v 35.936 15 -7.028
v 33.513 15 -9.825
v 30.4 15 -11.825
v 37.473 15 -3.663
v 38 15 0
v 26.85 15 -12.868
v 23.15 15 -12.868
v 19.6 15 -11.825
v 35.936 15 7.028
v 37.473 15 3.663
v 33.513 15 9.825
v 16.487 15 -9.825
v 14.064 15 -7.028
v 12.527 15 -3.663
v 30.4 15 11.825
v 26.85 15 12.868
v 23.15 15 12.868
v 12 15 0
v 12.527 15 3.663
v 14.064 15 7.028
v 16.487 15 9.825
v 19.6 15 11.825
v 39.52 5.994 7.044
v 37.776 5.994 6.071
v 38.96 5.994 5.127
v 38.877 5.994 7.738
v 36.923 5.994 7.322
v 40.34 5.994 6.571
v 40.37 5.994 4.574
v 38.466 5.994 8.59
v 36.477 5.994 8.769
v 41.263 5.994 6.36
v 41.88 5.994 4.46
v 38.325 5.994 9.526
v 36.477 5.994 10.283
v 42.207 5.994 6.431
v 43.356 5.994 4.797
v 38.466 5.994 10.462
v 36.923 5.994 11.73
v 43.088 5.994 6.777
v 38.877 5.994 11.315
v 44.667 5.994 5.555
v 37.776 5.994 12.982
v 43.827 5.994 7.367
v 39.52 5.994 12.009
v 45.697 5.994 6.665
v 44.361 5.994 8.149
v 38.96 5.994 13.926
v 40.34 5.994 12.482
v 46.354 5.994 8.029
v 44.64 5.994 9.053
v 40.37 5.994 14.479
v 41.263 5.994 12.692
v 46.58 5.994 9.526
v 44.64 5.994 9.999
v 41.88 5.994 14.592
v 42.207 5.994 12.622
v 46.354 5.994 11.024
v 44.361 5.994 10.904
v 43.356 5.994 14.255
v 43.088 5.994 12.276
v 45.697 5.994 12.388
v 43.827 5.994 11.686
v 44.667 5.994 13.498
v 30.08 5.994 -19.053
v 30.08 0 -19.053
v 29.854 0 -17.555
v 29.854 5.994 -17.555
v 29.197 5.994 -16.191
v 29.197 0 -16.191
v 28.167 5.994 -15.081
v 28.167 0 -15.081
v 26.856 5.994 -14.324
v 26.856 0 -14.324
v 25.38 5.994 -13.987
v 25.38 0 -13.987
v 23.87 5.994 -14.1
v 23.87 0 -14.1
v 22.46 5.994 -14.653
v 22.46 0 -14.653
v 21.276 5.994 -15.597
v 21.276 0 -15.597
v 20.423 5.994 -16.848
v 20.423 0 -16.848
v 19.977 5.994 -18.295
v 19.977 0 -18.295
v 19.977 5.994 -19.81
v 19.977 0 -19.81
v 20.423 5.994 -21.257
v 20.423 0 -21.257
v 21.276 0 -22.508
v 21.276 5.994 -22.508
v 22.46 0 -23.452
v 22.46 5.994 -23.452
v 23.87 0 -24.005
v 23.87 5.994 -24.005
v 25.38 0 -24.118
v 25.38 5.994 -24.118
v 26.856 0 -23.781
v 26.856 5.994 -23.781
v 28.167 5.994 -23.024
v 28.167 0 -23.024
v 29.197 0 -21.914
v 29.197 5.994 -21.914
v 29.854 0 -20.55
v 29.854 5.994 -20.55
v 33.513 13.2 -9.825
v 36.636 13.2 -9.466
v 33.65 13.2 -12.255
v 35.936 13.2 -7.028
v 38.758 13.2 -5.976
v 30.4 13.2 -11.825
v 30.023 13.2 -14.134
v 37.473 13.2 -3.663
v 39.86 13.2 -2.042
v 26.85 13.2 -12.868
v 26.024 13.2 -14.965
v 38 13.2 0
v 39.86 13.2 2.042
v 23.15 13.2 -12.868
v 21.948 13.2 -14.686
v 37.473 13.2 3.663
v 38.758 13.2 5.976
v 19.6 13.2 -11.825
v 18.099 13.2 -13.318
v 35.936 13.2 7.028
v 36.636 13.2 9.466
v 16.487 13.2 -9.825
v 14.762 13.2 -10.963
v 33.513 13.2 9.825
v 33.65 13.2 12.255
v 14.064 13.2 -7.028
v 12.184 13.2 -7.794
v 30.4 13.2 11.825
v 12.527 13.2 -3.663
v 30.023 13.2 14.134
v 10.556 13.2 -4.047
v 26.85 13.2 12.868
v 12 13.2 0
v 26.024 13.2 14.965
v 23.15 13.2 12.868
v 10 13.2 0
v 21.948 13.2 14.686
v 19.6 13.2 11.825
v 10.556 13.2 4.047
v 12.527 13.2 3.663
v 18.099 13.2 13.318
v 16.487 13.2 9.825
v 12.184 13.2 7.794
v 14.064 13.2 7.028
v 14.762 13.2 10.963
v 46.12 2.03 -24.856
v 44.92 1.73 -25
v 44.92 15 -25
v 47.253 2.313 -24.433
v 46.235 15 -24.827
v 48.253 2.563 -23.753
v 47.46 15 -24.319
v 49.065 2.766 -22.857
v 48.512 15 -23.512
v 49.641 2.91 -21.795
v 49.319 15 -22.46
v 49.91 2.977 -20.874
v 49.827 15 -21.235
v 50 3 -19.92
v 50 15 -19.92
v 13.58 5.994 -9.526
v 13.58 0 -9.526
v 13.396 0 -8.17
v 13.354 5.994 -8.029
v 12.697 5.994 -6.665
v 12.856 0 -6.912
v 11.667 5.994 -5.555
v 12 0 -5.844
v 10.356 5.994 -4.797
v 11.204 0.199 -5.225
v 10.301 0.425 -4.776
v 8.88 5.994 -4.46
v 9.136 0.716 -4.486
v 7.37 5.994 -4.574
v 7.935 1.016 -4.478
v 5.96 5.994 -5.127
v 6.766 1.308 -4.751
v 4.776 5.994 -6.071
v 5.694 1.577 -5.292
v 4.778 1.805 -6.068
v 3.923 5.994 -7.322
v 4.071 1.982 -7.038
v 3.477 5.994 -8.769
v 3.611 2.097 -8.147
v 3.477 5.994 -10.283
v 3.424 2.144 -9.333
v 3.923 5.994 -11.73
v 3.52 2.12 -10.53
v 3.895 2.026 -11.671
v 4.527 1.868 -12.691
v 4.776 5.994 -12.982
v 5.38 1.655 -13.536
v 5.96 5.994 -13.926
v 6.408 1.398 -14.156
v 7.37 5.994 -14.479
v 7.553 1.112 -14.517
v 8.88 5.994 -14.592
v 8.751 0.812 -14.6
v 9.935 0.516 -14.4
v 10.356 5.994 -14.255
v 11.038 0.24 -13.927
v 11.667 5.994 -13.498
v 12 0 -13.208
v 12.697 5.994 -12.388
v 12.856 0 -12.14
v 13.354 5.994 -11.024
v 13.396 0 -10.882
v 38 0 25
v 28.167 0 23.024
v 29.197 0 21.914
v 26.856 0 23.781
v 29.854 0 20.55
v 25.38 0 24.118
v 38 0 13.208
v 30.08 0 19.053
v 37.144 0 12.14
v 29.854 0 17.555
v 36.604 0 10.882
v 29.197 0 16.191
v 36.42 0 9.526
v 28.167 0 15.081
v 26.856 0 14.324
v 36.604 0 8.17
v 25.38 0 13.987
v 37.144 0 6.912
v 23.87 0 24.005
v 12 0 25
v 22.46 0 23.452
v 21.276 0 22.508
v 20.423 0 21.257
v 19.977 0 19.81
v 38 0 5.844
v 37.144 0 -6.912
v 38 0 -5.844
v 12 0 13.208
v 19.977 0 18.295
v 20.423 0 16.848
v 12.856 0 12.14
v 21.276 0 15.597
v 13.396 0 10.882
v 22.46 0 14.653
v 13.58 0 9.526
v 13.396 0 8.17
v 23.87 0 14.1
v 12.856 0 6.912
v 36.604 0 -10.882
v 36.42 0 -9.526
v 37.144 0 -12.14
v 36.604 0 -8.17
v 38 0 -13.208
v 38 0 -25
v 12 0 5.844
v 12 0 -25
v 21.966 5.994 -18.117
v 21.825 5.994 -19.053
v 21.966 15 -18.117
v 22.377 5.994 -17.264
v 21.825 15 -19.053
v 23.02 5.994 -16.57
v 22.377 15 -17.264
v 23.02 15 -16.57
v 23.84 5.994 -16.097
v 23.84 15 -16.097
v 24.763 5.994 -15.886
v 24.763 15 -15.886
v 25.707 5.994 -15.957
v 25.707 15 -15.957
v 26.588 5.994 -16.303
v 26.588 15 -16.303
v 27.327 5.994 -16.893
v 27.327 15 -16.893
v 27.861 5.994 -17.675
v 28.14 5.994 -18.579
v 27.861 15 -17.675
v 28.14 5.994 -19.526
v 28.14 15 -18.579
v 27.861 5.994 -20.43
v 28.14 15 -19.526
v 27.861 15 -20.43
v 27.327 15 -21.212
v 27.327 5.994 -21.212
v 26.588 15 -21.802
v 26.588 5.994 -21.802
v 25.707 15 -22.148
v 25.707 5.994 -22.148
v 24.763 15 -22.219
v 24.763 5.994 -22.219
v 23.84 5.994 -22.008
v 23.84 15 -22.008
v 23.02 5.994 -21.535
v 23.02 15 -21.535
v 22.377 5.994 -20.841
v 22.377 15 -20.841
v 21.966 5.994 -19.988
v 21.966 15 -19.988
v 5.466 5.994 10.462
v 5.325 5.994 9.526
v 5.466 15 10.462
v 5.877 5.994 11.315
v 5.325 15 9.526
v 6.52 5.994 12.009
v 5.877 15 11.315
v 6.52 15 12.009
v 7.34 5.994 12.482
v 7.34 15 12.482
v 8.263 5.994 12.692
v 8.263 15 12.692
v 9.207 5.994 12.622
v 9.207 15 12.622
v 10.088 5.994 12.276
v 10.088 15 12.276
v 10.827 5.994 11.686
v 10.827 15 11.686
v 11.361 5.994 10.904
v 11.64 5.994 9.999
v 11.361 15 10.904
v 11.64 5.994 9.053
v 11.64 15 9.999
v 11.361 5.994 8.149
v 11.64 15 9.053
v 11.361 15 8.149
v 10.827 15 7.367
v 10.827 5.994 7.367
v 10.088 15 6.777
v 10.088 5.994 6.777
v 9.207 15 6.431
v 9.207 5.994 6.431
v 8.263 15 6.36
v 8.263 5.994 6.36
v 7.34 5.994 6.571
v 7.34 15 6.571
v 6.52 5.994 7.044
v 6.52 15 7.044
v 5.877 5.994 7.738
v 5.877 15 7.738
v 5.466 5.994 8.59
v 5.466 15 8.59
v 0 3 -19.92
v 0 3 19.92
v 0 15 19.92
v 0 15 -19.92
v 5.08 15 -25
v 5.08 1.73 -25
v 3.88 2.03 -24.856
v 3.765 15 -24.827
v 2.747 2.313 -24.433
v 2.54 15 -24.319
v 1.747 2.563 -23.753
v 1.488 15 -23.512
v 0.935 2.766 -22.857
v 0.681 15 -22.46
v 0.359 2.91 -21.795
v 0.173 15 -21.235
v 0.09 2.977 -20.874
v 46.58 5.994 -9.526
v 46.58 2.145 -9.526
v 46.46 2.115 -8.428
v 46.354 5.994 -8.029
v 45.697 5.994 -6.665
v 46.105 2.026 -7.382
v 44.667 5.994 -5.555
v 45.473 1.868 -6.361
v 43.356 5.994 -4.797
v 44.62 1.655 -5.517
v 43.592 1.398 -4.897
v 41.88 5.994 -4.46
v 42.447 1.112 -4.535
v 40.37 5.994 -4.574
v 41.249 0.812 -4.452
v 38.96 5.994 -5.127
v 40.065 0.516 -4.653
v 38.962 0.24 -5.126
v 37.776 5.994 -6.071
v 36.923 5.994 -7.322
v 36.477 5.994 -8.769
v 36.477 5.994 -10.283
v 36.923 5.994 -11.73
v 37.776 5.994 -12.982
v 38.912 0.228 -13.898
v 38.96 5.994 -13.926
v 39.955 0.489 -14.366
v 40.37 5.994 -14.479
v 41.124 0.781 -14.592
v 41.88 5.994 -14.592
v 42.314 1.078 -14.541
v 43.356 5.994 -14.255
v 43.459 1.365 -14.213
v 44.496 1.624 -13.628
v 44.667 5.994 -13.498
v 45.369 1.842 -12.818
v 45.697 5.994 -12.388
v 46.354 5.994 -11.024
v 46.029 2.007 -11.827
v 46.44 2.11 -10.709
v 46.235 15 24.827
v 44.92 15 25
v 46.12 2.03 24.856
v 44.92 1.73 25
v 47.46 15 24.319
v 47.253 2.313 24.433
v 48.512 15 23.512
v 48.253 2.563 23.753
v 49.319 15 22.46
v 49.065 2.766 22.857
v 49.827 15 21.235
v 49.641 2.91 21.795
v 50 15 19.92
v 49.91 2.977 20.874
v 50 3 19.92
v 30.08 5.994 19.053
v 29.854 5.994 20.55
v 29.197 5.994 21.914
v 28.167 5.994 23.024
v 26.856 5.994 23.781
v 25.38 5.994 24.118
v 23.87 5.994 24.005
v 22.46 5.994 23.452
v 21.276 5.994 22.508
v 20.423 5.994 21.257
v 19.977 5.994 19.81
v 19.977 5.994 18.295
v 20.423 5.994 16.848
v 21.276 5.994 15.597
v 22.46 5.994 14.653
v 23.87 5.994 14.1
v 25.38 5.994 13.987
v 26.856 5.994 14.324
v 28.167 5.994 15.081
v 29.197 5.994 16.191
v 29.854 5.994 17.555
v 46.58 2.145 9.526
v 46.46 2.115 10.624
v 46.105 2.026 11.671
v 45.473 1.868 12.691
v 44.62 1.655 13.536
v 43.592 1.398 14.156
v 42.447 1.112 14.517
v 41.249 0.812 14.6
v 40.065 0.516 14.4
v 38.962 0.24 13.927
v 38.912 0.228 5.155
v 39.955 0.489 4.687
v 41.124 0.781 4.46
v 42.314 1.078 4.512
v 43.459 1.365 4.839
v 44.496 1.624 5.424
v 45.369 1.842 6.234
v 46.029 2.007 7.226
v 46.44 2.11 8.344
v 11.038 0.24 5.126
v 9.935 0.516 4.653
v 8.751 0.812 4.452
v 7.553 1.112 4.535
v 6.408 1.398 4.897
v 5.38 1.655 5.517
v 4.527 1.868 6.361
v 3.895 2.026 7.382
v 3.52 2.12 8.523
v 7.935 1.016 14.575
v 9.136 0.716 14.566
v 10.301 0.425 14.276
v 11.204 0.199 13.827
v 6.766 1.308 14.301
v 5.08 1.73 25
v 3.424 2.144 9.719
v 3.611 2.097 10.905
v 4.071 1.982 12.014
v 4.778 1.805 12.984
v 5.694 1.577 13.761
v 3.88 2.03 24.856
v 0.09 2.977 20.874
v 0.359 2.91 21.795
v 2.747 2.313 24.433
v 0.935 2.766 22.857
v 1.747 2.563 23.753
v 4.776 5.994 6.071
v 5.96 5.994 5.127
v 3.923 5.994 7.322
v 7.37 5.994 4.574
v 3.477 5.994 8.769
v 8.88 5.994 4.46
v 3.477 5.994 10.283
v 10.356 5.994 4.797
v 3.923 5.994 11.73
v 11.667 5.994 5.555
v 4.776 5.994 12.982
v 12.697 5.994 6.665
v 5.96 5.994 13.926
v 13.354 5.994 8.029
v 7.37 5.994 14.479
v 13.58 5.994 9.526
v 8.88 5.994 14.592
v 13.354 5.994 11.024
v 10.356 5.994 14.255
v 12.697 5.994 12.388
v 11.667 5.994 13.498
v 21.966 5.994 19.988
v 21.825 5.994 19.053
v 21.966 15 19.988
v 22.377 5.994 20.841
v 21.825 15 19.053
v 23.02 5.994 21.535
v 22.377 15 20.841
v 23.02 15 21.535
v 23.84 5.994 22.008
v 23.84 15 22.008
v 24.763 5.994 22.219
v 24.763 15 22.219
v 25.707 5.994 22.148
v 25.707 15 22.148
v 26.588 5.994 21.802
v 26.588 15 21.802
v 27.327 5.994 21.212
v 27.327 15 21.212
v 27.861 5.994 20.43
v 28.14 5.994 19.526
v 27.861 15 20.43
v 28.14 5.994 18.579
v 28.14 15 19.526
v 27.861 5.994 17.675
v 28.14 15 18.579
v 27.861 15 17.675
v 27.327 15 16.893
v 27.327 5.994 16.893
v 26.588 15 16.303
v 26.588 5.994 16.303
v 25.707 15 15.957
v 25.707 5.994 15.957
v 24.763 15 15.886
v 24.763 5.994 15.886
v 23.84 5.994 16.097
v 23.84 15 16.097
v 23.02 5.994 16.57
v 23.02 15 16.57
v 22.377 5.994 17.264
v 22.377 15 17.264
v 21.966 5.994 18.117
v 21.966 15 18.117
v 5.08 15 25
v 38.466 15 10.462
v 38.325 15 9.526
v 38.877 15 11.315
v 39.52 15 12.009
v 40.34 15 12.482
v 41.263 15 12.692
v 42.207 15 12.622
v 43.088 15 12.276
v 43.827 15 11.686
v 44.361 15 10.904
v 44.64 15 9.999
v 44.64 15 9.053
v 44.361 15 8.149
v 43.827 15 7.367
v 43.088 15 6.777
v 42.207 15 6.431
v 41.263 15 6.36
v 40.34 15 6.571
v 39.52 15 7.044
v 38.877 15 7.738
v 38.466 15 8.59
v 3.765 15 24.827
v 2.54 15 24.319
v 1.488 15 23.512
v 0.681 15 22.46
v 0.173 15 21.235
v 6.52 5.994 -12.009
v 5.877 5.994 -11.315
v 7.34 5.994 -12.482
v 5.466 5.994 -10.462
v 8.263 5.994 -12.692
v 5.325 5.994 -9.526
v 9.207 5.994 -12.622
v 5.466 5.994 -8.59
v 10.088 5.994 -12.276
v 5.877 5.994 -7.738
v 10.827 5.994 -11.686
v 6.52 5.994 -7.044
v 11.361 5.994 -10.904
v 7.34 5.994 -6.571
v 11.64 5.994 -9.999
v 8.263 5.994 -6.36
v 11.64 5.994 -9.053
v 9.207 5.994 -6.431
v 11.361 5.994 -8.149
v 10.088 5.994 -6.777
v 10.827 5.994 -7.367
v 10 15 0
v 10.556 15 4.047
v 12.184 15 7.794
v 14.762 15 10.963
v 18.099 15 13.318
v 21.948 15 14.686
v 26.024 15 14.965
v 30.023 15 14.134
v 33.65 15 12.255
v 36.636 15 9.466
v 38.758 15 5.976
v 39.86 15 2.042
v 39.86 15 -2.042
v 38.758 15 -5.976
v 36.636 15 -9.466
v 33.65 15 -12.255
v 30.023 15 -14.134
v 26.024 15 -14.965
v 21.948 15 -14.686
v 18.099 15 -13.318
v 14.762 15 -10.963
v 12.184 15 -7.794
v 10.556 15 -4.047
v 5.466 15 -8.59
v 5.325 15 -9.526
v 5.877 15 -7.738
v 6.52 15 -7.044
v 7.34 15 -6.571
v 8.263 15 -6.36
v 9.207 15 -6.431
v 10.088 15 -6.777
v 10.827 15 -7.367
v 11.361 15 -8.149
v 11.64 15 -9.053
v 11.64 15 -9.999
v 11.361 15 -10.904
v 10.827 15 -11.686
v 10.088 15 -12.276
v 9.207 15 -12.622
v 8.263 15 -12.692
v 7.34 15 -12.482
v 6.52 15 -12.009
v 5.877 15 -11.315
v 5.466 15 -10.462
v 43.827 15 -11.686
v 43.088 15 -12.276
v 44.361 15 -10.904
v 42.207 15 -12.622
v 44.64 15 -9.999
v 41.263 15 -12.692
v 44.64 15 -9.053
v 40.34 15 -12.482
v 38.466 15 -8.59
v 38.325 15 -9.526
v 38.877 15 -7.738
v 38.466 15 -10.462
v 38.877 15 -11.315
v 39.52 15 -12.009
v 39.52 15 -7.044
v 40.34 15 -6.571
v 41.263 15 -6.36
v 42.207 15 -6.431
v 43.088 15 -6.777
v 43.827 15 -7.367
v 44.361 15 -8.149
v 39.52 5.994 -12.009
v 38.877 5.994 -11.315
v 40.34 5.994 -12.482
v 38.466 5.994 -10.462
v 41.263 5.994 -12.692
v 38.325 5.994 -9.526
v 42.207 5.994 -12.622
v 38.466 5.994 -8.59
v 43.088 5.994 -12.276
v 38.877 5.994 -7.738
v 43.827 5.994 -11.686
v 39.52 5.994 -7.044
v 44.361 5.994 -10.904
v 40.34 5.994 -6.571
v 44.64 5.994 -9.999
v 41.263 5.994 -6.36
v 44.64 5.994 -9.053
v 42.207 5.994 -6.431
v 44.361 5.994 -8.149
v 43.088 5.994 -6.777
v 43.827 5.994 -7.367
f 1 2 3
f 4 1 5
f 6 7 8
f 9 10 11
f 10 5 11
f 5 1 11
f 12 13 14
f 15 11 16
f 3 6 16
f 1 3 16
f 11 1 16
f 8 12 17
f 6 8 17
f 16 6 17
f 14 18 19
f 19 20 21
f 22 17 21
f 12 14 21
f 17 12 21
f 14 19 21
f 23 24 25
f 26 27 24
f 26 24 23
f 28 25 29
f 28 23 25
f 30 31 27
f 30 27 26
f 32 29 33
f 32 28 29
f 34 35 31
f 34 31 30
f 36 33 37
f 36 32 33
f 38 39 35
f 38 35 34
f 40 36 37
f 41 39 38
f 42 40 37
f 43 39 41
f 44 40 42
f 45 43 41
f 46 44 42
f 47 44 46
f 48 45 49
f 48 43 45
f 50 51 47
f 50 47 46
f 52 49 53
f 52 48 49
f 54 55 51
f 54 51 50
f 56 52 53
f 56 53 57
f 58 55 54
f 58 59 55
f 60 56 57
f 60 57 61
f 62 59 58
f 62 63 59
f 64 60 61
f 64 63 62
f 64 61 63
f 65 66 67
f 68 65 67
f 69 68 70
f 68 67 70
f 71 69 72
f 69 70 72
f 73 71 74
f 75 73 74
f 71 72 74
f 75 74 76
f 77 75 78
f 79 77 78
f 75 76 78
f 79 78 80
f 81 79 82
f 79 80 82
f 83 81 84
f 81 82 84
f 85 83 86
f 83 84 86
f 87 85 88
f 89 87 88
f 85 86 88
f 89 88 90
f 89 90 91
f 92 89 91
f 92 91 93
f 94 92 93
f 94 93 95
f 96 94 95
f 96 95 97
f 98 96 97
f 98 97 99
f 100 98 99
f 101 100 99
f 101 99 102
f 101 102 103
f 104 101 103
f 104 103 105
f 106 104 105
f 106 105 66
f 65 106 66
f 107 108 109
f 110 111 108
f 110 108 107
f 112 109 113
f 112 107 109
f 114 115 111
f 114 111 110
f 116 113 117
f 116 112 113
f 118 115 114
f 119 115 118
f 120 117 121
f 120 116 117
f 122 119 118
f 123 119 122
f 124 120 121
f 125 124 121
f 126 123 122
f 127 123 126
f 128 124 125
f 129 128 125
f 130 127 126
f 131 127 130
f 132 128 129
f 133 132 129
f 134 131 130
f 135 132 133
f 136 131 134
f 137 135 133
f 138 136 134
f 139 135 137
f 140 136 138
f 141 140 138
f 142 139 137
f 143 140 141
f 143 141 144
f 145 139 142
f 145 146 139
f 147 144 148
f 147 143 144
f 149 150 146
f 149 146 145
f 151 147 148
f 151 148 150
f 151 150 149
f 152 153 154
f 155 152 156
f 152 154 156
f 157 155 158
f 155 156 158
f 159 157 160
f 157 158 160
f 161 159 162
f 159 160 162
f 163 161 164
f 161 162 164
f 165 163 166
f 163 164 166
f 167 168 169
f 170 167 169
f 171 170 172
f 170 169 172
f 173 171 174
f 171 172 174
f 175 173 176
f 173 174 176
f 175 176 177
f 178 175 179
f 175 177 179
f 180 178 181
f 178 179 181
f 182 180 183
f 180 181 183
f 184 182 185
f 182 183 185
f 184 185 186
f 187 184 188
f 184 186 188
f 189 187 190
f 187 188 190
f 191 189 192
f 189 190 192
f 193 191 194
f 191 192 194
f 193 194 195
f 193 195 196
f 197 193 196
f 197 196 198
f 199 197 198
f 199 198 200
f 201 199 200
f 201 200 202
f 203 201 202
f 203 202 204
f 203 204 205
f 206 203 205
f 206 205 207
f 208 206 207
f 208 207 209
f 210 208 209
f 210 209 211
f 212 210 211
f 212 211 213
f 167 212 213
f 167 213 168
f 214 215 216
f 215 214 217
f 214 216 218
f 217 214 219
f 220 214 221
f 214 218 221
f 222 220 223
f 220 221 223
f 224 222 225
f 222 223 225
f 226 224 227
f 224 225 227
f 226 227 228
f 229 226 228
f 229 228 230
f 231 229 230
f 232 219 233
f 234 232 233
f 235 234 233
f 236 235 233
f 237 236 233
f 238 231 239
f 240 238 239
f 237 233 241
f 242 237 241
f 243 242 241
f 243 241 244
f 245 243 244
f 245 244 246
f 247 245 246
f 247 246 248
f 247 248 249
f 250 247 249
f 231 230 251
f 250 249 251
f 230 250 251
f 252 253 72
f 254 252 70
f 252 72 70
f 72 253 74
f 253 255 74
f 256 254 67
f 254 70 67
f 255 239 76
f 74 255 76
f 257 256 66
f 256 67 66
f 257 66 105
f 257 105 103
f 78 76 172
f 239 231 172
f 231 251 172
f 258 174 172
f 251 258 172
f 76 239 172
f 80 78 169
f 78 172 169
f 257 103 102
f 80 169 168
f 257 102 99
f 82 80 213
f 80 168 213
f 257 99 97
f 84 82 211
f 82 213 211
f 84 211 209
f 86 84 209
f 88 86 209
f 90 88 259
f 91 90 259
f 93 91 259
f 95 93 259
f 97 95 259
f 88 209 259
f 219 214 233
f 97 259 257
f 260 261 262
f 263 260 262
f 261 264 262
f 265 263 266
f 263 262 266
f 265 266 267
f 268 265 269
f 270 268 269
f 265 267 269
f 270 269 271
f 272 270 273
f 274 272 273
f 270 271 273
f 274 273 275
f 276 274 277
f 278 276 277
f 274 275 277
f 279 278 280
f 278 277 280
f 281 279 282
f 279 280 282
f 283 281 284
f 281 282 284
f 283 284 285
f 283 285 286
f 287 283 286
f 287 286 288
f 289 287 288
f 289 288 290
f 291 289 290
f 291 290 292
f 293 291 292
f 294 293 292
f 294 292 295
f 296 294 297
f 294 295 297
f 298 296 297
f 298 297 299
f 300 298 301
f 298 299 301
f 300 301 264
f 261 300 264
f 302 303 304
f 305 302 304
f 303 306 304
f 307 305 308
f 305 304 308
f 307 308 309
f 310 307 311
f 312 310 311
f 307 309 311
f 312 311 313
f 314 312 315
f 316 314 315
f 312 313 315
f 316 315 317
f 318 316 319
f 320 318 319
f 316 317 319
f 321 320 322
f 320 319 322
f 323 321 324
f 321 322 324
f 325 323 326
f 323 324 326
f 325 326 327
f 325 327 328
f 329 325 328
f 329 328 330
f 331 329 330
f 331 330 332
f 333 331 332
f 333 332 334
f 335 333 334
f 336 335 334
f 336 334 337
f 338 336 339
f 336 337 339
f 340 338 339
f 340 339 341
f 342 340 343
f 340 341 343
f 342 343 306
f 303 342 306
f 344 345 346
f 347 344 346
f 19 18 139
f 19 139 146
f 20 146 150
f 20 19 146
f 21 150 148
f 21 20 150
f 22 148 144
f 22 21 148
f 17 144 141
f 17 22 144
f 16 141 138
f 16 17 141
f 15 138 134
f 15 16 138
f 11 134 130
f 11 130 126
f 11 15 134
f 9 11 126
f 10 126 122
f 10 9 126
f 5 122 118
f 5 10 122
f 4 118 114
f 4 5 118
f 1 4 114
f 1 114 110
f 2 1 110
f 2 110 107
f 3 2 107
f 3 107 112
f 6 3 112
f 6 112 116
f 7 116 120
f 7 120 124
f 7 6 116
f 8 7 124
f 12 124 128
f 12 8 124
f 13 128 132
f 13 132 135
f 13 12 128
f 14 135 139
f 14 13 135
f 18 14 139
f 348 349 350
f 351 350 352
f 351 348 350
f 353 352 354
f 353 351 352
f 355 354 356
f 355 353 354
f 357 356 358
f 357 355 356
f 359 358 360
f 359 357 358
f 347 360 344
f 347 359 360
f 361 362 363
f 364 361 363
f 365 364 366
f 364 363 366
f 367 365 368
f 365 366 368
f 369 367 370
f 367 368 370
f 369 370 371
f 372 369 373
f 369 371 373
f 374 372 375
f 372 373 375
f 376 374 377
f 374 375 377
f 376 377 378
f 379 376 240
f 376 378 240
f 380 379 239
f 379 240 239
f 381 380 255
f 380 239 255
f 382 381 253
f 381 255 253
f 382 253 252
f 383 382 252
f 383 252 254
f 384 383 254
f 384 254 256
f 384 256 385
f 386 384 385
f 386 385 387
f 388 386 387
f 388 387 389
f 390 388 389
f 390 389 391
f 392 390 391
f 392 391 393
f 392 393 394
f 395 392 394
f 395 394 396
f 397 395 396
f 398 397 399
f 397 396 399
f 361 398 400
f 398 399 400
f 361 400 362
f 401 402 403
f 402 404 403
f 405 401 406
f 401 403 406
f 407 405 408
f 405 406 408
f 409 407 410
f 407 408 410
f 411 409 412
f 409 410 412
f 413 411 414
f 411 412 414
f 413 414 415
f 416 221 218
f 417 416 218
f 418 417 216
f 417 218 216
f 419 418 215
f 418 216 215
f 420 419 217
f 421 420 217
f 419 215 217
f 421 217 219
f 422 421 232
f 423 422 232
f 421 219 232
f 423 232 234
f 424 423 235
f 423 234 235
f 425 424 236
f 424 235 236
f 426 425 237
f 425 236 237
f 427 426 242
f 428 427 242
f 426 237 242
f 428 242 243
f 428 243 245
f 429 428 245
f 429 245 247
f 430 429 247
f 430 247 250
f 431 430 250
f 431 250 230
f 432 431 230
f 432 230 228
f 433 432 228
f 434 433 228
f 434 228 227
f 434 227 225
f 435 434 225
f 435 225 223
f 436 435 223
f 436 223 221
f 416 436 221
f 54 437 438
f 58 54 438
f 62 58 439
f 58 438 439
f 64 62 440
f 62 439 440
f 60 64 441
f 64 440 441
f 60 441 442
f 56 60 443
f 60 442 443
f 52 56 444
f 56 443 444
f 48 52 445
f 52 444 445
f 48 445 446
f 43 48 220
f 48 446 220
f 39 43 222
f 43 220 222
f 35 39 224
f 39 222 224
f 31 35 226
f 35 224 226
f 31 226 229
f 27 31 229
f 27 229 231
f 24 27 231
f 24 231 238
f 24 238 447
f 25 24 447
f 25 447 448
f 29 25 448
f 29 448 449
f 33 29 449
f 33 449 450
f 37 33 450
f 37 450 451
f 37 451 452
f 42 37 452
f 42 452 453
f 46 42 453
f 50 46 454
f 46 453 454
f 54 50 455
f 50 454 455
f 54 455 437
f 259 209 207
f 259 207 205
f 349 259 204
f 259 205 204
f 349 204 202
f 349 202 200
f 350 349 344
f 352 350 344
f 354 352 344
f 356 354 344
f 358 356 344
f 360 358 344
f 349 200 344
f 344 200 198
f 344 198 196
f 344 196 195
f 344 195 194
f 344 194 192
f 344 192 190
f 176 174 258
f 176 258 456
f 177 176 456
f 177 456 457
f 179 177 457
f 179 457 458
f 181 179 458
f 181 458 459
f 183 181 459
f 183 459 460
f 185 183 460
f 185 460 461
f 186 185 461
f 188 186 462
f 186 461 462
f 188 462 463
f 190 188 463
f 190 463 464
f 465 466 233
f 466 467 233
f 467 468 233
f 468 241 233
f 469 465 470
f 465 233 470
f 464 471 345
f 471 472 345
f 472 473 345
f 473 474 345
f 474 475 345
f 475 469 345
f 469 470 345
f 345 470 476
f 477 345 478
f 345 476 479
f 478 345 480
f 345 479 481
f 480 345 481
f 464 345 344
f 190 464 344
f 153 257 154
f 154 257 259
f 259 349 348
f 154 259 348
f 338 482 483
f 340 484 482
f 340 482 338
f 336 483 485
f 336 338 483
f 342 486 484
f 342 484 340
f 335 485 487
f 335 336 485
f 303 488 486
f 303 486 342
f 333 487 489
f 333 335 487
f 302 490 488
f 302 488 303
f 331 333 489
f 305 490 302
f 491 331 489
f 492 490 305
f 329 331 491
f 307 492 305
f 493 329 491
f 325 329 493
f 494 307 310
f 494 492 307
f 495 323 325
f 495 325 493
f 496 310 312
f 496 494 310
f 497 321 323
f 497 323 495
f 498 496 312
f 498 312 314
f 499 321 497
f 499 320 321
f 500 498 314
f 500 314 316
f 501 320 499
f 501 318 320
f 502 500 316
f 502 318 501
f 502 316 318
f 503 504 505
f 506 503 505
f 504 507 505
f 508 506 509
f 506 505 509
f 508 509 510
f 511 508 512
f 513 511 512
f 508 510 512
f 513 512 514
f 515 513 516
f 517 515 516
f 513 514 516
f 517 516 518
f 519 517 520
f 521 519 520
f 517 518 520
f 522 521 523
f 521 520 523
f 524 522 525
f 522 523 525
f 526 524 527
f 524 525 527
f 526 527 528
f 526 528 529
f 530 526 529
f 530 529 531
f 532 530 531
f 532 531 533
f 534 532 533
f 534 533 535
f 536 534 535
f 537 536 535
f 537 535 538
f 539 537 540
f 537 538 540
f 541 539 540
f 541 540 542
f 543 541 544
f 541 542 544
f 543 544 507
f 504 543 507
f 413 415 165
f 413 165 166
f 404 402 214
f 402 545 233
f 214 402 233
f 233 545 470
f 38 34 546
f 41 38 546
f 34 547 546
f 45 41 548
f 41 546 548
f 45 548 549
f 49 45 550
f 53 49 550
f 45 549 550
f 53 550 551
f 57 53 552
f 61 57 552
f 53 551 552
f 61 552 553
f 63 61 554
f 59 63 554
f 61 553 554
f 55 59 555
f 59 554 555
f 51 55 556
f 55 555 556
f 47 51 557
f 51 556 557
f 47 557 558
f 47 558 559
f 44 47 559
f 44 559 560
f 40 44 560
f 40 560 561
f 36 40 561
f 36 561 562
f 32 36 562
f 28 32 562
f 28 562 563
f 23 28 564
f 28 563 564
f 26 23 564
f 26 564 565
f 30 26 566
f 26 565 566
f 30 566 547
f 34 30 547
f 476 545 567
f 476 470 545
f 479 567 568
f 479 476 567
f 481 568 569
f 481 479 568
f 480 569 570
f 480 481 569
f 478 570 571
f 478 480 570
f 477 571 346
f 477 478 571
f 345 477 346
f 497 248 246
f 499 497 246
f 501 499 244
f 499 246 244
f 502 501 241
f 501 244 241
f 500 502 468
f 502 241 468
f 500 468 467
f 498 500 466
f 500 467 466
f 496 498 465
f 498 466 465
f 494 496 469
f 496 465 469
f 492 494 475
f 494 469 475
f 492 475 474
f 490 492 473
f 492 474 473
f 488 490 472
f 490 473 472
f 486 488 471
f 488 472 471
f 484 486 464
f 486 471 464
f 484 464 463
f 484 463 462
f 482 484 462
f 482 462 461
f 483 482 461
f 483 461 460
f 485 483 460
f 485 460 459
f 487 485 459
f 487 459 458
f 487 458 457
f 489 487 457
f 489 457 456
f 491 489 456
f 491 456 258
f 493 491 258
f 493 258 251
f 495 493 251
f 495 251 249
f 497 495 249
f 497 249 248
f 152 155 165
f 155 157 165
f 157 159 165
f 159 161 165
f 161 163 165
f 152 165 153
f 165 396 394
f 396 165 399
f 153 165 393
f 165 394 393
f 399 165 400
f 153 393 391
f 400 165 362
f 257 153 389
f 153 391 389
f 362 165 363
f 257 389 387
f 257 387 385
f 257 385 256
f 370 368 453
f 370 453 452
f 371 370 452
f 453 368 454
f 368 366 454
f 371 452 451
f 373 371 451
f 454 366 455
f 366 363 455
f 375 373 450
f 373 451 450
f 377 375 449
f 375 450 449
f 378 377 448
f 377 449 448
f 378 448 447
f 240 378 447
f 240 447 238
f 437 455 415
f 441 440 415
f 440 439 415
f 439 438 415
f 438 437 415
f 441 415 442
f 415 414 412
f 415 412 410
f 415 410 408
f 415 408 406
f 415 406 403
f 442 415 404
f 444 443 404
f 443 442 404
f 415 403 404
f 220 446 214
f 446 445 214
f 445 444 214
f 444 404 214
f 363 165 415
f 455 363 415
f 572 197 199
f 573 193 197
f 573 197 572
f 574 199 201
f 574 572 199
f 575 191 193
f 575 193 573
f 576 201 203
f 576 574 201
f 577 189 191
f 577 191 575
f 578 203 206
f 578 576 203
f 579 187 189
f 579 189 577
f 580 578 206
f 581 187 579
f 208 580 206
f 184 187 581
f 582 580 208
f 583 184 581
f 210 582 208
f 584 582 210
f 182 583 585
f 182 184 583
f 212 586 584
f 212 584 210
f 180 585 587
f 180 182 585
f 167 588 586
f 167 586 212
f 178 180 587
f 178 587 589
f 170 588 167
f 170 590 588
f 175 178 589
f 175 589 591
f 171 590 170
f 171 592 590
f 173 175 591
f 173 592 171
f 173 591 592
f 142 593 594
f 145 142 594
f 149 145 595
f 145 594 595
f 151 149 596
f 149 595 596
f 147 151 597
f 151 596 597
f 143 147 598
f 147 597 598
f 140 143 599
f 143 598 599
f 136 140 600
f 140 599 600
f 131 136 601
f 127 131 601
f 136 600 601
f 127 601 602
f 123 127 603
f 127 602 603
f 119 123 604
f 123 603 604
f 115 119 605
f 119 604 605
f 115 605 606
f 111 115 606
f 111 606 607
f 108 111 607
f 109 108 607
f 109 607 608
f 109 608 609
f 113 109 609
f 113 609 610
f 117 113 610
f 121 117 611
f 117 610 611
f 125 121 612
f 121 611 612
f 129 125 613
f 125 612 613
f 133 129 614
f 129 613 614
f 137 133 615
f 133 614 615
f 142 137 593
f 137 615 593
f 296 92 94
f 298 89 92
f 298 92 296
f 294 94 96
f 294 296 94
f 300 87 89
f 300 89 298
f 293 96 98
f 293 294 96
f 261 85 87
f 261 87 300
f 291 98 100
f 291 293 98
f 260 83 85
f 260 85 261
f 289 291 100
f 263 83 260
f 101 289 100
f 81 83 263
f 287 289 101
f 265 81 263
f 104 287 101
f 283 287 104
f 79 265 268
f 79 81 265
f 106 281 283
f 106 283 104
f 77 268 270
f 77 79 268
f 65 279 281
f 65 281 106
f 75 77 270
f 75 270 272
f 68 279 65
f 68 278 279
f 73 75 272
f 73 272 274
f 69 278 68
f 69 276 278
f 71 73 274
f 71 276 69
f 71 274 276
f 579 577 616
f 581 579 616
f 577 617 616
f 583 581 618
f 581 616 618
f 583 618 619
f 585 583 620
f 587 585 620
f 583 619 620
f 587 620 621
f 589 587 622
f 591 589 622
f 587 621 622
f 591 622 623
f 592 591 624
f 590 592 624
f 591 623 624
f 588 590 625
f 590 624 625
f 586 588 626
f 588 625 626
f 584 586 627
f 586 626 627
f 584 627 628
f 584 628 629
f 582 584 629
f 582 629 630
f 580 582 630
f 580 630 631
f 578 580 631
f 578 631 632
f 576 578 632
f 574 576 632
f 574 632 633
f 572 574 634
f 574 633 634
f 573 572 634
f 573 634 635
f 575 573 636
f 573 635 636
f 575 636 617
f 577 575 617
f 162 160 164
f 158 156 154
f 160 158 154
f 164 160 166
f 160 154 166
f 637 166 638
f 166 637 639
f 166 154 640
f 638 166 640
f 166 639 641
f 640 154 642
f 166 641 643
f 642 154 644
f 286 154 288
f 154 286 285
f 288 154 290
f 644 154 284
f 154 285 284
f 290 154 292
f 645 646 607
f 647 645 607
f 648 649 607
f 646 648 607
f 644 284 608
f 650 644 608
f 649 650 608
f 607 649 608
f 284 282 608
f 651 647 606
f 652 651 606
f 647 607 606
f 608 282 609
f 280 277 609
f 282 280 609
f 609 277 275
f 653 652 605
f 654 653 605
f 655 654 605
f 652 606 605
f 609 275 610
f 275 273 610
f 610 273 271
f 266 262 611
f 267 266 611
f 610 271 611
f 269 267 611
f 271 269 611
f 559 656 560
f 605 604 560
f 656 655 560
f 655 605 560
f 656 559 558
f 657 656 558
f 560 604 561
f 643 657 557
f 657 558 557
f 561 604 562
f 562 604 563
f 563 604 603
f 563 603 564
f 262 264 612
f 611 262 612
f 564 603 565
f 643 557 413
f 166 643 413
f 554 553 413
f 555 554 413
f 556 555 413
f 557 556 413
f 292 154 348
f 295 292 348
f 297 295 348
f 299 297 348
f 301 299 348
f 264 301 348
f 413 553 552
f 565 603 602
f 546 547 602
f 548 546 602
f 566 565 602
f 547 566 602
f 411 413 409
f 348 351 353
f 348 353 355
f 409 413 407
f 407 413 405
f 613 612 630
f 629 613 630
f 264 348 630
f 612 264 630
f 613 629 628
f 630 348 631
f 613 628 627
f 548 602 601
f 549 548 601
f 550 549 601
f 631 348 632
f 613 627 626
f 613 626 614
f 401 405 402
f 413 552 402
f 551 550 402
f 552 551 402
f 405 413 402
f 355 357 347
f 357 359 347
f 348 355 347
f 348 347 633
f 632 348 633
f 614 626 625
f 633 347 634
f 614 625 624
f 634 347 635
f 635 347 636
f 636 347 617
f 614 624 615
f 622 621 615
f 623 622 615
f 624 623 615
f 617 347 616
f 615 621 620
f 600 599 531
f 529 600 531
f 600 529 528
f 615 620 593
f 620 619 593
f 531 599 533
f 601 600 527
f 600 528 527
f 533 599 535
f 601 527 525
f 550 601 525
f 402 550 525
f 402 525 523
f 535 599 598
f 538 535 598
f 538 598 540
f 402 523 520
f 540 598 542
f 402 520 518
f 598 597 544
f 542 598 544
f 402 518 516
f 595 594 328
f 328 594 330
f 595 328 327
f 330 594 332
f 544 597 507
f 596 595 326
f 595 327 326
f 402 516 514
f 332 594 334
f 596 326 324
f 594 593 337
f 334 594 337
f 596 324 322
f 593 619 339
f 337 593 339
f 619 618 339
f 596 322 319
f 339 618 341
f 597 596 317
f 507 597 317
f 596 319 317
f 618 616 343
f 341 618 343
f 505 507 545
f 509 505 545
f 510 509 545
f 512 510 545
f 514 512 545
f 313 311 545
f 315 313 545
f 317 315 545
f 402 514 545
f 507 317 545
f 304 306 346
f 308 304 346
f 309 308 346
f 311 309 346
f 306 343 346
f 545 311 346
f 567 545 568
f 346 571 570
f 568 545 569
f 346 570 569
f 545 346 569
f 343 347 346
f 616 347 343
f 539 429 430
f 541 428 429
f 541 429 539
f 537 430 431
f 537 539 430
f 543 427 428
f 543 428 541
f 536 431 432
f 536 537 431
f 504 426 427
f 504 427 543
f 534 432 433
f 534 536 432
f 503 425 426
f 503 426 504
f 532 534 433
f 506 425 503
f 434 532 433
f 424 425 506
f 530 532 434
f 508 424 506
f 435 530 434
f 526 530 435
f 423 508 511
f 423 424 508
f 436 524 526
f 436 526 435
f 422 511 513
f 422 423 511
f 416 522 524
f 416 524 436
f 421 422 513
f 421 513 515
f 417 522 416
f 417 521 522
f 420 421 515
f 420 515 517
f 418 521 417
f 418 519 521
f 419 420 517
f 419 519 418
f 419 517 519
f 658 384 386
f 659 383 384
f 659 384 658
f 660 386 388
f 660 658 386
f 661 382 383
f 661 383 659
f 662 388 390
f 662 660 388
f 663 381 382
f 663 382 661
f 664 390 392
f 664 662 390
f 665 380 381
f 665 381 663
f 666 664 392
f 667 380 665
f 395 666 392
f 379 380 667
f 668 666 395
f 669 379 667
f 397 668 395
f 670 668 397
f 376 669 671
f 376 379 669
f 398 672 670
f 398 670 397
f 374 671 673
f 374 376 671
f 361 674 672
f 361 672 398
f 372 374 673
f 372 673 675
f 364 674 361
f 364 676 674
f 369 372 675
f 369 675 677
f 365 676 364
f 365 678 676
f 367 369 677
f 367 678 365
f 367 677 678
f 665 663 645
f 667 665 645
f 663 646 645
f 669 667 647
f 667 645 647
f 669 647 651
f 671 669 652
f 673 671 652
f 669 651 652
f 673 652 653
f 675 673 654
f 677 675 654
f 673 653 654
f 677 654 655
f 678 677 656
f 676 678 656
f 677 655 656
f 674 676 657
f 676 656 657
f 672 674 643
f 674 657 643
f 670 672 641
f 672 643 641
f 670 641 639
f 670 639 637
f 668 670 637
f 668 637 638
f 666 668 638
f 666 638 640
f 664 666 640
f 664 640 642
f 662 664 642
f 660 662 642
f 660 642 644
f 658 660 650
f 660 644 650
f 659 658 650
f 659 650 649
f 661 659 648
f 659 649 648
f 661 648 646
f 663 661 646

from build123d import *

# Parameters (mm, degrees)
F1_DEPTH       = 50
F3_D           = 6.35
F3_CBORE_D     = 10.16
F3_CBORE_DEPTH = 5.9944
F5_DEPTH       = 50.001
F6_R           = 5.08
F7_R           = 15
F7_R_2         = 13
F8_DEPTH       = 1.8


with BuildPart() as f1:
    # F0 (on Right) → F1 (new body)
    with BuildSketch(Plane.YZ):
        Polygon((0, 25), (0, 0), (0, -25), (15, -25), (15, 25), align=None)
    extrude(amount=F1_DEPTH)

    # F3 (through all)
    with Locations(Plane.XZ):
        with Locations((25, 19.052559), (8.5, 9.526279), (41.5, 9.526279), (41.5, -9.526279), (25, -19.052559), (8.5, -9.526279)):
            CounterBoreHole(F3_D / 2, F3_CBORE_D / 2, F3_CBORE_DEPTH)

    # F4 (on face) → F5 (cut, through all)
    with BuildSketch(Plane.XY.offset(25)):
        Polygon((50, 0), (50, 3), (38, 0), align=None)
        Polygon((0, 0), (12, 0), (0, 3), align=None)
    extrude(amount=-F5_DEPTH, mode=Mode.SUBTRACT)

    # F6
    f6_edges = [f1.edges().sort_by_distance(p)[0] for p in [
        (50, 9, 25),
        (0, 9, 25),
        (0, 9, -25),
        (50, 9, -25),
    ]]
    fillet(f6_edges, radius=F6_R)

    # F7 (on face) → F8 (cut)
    with BuildSketch(Plane(origin=(0, 15, 0), x_dir=(-1, 0, 0), z_dir=(0, 1, 0))):
        with Locations((-25, 0)):
            Circle(F7_R)
        with Locations((-25, 0)):
            Circle(F7_R_2, mode=Mode.SUBTRACT)
    extrude(amount=-F8_DEPTH, mode=Mode.SUBTRACT)


solid = f1.part
